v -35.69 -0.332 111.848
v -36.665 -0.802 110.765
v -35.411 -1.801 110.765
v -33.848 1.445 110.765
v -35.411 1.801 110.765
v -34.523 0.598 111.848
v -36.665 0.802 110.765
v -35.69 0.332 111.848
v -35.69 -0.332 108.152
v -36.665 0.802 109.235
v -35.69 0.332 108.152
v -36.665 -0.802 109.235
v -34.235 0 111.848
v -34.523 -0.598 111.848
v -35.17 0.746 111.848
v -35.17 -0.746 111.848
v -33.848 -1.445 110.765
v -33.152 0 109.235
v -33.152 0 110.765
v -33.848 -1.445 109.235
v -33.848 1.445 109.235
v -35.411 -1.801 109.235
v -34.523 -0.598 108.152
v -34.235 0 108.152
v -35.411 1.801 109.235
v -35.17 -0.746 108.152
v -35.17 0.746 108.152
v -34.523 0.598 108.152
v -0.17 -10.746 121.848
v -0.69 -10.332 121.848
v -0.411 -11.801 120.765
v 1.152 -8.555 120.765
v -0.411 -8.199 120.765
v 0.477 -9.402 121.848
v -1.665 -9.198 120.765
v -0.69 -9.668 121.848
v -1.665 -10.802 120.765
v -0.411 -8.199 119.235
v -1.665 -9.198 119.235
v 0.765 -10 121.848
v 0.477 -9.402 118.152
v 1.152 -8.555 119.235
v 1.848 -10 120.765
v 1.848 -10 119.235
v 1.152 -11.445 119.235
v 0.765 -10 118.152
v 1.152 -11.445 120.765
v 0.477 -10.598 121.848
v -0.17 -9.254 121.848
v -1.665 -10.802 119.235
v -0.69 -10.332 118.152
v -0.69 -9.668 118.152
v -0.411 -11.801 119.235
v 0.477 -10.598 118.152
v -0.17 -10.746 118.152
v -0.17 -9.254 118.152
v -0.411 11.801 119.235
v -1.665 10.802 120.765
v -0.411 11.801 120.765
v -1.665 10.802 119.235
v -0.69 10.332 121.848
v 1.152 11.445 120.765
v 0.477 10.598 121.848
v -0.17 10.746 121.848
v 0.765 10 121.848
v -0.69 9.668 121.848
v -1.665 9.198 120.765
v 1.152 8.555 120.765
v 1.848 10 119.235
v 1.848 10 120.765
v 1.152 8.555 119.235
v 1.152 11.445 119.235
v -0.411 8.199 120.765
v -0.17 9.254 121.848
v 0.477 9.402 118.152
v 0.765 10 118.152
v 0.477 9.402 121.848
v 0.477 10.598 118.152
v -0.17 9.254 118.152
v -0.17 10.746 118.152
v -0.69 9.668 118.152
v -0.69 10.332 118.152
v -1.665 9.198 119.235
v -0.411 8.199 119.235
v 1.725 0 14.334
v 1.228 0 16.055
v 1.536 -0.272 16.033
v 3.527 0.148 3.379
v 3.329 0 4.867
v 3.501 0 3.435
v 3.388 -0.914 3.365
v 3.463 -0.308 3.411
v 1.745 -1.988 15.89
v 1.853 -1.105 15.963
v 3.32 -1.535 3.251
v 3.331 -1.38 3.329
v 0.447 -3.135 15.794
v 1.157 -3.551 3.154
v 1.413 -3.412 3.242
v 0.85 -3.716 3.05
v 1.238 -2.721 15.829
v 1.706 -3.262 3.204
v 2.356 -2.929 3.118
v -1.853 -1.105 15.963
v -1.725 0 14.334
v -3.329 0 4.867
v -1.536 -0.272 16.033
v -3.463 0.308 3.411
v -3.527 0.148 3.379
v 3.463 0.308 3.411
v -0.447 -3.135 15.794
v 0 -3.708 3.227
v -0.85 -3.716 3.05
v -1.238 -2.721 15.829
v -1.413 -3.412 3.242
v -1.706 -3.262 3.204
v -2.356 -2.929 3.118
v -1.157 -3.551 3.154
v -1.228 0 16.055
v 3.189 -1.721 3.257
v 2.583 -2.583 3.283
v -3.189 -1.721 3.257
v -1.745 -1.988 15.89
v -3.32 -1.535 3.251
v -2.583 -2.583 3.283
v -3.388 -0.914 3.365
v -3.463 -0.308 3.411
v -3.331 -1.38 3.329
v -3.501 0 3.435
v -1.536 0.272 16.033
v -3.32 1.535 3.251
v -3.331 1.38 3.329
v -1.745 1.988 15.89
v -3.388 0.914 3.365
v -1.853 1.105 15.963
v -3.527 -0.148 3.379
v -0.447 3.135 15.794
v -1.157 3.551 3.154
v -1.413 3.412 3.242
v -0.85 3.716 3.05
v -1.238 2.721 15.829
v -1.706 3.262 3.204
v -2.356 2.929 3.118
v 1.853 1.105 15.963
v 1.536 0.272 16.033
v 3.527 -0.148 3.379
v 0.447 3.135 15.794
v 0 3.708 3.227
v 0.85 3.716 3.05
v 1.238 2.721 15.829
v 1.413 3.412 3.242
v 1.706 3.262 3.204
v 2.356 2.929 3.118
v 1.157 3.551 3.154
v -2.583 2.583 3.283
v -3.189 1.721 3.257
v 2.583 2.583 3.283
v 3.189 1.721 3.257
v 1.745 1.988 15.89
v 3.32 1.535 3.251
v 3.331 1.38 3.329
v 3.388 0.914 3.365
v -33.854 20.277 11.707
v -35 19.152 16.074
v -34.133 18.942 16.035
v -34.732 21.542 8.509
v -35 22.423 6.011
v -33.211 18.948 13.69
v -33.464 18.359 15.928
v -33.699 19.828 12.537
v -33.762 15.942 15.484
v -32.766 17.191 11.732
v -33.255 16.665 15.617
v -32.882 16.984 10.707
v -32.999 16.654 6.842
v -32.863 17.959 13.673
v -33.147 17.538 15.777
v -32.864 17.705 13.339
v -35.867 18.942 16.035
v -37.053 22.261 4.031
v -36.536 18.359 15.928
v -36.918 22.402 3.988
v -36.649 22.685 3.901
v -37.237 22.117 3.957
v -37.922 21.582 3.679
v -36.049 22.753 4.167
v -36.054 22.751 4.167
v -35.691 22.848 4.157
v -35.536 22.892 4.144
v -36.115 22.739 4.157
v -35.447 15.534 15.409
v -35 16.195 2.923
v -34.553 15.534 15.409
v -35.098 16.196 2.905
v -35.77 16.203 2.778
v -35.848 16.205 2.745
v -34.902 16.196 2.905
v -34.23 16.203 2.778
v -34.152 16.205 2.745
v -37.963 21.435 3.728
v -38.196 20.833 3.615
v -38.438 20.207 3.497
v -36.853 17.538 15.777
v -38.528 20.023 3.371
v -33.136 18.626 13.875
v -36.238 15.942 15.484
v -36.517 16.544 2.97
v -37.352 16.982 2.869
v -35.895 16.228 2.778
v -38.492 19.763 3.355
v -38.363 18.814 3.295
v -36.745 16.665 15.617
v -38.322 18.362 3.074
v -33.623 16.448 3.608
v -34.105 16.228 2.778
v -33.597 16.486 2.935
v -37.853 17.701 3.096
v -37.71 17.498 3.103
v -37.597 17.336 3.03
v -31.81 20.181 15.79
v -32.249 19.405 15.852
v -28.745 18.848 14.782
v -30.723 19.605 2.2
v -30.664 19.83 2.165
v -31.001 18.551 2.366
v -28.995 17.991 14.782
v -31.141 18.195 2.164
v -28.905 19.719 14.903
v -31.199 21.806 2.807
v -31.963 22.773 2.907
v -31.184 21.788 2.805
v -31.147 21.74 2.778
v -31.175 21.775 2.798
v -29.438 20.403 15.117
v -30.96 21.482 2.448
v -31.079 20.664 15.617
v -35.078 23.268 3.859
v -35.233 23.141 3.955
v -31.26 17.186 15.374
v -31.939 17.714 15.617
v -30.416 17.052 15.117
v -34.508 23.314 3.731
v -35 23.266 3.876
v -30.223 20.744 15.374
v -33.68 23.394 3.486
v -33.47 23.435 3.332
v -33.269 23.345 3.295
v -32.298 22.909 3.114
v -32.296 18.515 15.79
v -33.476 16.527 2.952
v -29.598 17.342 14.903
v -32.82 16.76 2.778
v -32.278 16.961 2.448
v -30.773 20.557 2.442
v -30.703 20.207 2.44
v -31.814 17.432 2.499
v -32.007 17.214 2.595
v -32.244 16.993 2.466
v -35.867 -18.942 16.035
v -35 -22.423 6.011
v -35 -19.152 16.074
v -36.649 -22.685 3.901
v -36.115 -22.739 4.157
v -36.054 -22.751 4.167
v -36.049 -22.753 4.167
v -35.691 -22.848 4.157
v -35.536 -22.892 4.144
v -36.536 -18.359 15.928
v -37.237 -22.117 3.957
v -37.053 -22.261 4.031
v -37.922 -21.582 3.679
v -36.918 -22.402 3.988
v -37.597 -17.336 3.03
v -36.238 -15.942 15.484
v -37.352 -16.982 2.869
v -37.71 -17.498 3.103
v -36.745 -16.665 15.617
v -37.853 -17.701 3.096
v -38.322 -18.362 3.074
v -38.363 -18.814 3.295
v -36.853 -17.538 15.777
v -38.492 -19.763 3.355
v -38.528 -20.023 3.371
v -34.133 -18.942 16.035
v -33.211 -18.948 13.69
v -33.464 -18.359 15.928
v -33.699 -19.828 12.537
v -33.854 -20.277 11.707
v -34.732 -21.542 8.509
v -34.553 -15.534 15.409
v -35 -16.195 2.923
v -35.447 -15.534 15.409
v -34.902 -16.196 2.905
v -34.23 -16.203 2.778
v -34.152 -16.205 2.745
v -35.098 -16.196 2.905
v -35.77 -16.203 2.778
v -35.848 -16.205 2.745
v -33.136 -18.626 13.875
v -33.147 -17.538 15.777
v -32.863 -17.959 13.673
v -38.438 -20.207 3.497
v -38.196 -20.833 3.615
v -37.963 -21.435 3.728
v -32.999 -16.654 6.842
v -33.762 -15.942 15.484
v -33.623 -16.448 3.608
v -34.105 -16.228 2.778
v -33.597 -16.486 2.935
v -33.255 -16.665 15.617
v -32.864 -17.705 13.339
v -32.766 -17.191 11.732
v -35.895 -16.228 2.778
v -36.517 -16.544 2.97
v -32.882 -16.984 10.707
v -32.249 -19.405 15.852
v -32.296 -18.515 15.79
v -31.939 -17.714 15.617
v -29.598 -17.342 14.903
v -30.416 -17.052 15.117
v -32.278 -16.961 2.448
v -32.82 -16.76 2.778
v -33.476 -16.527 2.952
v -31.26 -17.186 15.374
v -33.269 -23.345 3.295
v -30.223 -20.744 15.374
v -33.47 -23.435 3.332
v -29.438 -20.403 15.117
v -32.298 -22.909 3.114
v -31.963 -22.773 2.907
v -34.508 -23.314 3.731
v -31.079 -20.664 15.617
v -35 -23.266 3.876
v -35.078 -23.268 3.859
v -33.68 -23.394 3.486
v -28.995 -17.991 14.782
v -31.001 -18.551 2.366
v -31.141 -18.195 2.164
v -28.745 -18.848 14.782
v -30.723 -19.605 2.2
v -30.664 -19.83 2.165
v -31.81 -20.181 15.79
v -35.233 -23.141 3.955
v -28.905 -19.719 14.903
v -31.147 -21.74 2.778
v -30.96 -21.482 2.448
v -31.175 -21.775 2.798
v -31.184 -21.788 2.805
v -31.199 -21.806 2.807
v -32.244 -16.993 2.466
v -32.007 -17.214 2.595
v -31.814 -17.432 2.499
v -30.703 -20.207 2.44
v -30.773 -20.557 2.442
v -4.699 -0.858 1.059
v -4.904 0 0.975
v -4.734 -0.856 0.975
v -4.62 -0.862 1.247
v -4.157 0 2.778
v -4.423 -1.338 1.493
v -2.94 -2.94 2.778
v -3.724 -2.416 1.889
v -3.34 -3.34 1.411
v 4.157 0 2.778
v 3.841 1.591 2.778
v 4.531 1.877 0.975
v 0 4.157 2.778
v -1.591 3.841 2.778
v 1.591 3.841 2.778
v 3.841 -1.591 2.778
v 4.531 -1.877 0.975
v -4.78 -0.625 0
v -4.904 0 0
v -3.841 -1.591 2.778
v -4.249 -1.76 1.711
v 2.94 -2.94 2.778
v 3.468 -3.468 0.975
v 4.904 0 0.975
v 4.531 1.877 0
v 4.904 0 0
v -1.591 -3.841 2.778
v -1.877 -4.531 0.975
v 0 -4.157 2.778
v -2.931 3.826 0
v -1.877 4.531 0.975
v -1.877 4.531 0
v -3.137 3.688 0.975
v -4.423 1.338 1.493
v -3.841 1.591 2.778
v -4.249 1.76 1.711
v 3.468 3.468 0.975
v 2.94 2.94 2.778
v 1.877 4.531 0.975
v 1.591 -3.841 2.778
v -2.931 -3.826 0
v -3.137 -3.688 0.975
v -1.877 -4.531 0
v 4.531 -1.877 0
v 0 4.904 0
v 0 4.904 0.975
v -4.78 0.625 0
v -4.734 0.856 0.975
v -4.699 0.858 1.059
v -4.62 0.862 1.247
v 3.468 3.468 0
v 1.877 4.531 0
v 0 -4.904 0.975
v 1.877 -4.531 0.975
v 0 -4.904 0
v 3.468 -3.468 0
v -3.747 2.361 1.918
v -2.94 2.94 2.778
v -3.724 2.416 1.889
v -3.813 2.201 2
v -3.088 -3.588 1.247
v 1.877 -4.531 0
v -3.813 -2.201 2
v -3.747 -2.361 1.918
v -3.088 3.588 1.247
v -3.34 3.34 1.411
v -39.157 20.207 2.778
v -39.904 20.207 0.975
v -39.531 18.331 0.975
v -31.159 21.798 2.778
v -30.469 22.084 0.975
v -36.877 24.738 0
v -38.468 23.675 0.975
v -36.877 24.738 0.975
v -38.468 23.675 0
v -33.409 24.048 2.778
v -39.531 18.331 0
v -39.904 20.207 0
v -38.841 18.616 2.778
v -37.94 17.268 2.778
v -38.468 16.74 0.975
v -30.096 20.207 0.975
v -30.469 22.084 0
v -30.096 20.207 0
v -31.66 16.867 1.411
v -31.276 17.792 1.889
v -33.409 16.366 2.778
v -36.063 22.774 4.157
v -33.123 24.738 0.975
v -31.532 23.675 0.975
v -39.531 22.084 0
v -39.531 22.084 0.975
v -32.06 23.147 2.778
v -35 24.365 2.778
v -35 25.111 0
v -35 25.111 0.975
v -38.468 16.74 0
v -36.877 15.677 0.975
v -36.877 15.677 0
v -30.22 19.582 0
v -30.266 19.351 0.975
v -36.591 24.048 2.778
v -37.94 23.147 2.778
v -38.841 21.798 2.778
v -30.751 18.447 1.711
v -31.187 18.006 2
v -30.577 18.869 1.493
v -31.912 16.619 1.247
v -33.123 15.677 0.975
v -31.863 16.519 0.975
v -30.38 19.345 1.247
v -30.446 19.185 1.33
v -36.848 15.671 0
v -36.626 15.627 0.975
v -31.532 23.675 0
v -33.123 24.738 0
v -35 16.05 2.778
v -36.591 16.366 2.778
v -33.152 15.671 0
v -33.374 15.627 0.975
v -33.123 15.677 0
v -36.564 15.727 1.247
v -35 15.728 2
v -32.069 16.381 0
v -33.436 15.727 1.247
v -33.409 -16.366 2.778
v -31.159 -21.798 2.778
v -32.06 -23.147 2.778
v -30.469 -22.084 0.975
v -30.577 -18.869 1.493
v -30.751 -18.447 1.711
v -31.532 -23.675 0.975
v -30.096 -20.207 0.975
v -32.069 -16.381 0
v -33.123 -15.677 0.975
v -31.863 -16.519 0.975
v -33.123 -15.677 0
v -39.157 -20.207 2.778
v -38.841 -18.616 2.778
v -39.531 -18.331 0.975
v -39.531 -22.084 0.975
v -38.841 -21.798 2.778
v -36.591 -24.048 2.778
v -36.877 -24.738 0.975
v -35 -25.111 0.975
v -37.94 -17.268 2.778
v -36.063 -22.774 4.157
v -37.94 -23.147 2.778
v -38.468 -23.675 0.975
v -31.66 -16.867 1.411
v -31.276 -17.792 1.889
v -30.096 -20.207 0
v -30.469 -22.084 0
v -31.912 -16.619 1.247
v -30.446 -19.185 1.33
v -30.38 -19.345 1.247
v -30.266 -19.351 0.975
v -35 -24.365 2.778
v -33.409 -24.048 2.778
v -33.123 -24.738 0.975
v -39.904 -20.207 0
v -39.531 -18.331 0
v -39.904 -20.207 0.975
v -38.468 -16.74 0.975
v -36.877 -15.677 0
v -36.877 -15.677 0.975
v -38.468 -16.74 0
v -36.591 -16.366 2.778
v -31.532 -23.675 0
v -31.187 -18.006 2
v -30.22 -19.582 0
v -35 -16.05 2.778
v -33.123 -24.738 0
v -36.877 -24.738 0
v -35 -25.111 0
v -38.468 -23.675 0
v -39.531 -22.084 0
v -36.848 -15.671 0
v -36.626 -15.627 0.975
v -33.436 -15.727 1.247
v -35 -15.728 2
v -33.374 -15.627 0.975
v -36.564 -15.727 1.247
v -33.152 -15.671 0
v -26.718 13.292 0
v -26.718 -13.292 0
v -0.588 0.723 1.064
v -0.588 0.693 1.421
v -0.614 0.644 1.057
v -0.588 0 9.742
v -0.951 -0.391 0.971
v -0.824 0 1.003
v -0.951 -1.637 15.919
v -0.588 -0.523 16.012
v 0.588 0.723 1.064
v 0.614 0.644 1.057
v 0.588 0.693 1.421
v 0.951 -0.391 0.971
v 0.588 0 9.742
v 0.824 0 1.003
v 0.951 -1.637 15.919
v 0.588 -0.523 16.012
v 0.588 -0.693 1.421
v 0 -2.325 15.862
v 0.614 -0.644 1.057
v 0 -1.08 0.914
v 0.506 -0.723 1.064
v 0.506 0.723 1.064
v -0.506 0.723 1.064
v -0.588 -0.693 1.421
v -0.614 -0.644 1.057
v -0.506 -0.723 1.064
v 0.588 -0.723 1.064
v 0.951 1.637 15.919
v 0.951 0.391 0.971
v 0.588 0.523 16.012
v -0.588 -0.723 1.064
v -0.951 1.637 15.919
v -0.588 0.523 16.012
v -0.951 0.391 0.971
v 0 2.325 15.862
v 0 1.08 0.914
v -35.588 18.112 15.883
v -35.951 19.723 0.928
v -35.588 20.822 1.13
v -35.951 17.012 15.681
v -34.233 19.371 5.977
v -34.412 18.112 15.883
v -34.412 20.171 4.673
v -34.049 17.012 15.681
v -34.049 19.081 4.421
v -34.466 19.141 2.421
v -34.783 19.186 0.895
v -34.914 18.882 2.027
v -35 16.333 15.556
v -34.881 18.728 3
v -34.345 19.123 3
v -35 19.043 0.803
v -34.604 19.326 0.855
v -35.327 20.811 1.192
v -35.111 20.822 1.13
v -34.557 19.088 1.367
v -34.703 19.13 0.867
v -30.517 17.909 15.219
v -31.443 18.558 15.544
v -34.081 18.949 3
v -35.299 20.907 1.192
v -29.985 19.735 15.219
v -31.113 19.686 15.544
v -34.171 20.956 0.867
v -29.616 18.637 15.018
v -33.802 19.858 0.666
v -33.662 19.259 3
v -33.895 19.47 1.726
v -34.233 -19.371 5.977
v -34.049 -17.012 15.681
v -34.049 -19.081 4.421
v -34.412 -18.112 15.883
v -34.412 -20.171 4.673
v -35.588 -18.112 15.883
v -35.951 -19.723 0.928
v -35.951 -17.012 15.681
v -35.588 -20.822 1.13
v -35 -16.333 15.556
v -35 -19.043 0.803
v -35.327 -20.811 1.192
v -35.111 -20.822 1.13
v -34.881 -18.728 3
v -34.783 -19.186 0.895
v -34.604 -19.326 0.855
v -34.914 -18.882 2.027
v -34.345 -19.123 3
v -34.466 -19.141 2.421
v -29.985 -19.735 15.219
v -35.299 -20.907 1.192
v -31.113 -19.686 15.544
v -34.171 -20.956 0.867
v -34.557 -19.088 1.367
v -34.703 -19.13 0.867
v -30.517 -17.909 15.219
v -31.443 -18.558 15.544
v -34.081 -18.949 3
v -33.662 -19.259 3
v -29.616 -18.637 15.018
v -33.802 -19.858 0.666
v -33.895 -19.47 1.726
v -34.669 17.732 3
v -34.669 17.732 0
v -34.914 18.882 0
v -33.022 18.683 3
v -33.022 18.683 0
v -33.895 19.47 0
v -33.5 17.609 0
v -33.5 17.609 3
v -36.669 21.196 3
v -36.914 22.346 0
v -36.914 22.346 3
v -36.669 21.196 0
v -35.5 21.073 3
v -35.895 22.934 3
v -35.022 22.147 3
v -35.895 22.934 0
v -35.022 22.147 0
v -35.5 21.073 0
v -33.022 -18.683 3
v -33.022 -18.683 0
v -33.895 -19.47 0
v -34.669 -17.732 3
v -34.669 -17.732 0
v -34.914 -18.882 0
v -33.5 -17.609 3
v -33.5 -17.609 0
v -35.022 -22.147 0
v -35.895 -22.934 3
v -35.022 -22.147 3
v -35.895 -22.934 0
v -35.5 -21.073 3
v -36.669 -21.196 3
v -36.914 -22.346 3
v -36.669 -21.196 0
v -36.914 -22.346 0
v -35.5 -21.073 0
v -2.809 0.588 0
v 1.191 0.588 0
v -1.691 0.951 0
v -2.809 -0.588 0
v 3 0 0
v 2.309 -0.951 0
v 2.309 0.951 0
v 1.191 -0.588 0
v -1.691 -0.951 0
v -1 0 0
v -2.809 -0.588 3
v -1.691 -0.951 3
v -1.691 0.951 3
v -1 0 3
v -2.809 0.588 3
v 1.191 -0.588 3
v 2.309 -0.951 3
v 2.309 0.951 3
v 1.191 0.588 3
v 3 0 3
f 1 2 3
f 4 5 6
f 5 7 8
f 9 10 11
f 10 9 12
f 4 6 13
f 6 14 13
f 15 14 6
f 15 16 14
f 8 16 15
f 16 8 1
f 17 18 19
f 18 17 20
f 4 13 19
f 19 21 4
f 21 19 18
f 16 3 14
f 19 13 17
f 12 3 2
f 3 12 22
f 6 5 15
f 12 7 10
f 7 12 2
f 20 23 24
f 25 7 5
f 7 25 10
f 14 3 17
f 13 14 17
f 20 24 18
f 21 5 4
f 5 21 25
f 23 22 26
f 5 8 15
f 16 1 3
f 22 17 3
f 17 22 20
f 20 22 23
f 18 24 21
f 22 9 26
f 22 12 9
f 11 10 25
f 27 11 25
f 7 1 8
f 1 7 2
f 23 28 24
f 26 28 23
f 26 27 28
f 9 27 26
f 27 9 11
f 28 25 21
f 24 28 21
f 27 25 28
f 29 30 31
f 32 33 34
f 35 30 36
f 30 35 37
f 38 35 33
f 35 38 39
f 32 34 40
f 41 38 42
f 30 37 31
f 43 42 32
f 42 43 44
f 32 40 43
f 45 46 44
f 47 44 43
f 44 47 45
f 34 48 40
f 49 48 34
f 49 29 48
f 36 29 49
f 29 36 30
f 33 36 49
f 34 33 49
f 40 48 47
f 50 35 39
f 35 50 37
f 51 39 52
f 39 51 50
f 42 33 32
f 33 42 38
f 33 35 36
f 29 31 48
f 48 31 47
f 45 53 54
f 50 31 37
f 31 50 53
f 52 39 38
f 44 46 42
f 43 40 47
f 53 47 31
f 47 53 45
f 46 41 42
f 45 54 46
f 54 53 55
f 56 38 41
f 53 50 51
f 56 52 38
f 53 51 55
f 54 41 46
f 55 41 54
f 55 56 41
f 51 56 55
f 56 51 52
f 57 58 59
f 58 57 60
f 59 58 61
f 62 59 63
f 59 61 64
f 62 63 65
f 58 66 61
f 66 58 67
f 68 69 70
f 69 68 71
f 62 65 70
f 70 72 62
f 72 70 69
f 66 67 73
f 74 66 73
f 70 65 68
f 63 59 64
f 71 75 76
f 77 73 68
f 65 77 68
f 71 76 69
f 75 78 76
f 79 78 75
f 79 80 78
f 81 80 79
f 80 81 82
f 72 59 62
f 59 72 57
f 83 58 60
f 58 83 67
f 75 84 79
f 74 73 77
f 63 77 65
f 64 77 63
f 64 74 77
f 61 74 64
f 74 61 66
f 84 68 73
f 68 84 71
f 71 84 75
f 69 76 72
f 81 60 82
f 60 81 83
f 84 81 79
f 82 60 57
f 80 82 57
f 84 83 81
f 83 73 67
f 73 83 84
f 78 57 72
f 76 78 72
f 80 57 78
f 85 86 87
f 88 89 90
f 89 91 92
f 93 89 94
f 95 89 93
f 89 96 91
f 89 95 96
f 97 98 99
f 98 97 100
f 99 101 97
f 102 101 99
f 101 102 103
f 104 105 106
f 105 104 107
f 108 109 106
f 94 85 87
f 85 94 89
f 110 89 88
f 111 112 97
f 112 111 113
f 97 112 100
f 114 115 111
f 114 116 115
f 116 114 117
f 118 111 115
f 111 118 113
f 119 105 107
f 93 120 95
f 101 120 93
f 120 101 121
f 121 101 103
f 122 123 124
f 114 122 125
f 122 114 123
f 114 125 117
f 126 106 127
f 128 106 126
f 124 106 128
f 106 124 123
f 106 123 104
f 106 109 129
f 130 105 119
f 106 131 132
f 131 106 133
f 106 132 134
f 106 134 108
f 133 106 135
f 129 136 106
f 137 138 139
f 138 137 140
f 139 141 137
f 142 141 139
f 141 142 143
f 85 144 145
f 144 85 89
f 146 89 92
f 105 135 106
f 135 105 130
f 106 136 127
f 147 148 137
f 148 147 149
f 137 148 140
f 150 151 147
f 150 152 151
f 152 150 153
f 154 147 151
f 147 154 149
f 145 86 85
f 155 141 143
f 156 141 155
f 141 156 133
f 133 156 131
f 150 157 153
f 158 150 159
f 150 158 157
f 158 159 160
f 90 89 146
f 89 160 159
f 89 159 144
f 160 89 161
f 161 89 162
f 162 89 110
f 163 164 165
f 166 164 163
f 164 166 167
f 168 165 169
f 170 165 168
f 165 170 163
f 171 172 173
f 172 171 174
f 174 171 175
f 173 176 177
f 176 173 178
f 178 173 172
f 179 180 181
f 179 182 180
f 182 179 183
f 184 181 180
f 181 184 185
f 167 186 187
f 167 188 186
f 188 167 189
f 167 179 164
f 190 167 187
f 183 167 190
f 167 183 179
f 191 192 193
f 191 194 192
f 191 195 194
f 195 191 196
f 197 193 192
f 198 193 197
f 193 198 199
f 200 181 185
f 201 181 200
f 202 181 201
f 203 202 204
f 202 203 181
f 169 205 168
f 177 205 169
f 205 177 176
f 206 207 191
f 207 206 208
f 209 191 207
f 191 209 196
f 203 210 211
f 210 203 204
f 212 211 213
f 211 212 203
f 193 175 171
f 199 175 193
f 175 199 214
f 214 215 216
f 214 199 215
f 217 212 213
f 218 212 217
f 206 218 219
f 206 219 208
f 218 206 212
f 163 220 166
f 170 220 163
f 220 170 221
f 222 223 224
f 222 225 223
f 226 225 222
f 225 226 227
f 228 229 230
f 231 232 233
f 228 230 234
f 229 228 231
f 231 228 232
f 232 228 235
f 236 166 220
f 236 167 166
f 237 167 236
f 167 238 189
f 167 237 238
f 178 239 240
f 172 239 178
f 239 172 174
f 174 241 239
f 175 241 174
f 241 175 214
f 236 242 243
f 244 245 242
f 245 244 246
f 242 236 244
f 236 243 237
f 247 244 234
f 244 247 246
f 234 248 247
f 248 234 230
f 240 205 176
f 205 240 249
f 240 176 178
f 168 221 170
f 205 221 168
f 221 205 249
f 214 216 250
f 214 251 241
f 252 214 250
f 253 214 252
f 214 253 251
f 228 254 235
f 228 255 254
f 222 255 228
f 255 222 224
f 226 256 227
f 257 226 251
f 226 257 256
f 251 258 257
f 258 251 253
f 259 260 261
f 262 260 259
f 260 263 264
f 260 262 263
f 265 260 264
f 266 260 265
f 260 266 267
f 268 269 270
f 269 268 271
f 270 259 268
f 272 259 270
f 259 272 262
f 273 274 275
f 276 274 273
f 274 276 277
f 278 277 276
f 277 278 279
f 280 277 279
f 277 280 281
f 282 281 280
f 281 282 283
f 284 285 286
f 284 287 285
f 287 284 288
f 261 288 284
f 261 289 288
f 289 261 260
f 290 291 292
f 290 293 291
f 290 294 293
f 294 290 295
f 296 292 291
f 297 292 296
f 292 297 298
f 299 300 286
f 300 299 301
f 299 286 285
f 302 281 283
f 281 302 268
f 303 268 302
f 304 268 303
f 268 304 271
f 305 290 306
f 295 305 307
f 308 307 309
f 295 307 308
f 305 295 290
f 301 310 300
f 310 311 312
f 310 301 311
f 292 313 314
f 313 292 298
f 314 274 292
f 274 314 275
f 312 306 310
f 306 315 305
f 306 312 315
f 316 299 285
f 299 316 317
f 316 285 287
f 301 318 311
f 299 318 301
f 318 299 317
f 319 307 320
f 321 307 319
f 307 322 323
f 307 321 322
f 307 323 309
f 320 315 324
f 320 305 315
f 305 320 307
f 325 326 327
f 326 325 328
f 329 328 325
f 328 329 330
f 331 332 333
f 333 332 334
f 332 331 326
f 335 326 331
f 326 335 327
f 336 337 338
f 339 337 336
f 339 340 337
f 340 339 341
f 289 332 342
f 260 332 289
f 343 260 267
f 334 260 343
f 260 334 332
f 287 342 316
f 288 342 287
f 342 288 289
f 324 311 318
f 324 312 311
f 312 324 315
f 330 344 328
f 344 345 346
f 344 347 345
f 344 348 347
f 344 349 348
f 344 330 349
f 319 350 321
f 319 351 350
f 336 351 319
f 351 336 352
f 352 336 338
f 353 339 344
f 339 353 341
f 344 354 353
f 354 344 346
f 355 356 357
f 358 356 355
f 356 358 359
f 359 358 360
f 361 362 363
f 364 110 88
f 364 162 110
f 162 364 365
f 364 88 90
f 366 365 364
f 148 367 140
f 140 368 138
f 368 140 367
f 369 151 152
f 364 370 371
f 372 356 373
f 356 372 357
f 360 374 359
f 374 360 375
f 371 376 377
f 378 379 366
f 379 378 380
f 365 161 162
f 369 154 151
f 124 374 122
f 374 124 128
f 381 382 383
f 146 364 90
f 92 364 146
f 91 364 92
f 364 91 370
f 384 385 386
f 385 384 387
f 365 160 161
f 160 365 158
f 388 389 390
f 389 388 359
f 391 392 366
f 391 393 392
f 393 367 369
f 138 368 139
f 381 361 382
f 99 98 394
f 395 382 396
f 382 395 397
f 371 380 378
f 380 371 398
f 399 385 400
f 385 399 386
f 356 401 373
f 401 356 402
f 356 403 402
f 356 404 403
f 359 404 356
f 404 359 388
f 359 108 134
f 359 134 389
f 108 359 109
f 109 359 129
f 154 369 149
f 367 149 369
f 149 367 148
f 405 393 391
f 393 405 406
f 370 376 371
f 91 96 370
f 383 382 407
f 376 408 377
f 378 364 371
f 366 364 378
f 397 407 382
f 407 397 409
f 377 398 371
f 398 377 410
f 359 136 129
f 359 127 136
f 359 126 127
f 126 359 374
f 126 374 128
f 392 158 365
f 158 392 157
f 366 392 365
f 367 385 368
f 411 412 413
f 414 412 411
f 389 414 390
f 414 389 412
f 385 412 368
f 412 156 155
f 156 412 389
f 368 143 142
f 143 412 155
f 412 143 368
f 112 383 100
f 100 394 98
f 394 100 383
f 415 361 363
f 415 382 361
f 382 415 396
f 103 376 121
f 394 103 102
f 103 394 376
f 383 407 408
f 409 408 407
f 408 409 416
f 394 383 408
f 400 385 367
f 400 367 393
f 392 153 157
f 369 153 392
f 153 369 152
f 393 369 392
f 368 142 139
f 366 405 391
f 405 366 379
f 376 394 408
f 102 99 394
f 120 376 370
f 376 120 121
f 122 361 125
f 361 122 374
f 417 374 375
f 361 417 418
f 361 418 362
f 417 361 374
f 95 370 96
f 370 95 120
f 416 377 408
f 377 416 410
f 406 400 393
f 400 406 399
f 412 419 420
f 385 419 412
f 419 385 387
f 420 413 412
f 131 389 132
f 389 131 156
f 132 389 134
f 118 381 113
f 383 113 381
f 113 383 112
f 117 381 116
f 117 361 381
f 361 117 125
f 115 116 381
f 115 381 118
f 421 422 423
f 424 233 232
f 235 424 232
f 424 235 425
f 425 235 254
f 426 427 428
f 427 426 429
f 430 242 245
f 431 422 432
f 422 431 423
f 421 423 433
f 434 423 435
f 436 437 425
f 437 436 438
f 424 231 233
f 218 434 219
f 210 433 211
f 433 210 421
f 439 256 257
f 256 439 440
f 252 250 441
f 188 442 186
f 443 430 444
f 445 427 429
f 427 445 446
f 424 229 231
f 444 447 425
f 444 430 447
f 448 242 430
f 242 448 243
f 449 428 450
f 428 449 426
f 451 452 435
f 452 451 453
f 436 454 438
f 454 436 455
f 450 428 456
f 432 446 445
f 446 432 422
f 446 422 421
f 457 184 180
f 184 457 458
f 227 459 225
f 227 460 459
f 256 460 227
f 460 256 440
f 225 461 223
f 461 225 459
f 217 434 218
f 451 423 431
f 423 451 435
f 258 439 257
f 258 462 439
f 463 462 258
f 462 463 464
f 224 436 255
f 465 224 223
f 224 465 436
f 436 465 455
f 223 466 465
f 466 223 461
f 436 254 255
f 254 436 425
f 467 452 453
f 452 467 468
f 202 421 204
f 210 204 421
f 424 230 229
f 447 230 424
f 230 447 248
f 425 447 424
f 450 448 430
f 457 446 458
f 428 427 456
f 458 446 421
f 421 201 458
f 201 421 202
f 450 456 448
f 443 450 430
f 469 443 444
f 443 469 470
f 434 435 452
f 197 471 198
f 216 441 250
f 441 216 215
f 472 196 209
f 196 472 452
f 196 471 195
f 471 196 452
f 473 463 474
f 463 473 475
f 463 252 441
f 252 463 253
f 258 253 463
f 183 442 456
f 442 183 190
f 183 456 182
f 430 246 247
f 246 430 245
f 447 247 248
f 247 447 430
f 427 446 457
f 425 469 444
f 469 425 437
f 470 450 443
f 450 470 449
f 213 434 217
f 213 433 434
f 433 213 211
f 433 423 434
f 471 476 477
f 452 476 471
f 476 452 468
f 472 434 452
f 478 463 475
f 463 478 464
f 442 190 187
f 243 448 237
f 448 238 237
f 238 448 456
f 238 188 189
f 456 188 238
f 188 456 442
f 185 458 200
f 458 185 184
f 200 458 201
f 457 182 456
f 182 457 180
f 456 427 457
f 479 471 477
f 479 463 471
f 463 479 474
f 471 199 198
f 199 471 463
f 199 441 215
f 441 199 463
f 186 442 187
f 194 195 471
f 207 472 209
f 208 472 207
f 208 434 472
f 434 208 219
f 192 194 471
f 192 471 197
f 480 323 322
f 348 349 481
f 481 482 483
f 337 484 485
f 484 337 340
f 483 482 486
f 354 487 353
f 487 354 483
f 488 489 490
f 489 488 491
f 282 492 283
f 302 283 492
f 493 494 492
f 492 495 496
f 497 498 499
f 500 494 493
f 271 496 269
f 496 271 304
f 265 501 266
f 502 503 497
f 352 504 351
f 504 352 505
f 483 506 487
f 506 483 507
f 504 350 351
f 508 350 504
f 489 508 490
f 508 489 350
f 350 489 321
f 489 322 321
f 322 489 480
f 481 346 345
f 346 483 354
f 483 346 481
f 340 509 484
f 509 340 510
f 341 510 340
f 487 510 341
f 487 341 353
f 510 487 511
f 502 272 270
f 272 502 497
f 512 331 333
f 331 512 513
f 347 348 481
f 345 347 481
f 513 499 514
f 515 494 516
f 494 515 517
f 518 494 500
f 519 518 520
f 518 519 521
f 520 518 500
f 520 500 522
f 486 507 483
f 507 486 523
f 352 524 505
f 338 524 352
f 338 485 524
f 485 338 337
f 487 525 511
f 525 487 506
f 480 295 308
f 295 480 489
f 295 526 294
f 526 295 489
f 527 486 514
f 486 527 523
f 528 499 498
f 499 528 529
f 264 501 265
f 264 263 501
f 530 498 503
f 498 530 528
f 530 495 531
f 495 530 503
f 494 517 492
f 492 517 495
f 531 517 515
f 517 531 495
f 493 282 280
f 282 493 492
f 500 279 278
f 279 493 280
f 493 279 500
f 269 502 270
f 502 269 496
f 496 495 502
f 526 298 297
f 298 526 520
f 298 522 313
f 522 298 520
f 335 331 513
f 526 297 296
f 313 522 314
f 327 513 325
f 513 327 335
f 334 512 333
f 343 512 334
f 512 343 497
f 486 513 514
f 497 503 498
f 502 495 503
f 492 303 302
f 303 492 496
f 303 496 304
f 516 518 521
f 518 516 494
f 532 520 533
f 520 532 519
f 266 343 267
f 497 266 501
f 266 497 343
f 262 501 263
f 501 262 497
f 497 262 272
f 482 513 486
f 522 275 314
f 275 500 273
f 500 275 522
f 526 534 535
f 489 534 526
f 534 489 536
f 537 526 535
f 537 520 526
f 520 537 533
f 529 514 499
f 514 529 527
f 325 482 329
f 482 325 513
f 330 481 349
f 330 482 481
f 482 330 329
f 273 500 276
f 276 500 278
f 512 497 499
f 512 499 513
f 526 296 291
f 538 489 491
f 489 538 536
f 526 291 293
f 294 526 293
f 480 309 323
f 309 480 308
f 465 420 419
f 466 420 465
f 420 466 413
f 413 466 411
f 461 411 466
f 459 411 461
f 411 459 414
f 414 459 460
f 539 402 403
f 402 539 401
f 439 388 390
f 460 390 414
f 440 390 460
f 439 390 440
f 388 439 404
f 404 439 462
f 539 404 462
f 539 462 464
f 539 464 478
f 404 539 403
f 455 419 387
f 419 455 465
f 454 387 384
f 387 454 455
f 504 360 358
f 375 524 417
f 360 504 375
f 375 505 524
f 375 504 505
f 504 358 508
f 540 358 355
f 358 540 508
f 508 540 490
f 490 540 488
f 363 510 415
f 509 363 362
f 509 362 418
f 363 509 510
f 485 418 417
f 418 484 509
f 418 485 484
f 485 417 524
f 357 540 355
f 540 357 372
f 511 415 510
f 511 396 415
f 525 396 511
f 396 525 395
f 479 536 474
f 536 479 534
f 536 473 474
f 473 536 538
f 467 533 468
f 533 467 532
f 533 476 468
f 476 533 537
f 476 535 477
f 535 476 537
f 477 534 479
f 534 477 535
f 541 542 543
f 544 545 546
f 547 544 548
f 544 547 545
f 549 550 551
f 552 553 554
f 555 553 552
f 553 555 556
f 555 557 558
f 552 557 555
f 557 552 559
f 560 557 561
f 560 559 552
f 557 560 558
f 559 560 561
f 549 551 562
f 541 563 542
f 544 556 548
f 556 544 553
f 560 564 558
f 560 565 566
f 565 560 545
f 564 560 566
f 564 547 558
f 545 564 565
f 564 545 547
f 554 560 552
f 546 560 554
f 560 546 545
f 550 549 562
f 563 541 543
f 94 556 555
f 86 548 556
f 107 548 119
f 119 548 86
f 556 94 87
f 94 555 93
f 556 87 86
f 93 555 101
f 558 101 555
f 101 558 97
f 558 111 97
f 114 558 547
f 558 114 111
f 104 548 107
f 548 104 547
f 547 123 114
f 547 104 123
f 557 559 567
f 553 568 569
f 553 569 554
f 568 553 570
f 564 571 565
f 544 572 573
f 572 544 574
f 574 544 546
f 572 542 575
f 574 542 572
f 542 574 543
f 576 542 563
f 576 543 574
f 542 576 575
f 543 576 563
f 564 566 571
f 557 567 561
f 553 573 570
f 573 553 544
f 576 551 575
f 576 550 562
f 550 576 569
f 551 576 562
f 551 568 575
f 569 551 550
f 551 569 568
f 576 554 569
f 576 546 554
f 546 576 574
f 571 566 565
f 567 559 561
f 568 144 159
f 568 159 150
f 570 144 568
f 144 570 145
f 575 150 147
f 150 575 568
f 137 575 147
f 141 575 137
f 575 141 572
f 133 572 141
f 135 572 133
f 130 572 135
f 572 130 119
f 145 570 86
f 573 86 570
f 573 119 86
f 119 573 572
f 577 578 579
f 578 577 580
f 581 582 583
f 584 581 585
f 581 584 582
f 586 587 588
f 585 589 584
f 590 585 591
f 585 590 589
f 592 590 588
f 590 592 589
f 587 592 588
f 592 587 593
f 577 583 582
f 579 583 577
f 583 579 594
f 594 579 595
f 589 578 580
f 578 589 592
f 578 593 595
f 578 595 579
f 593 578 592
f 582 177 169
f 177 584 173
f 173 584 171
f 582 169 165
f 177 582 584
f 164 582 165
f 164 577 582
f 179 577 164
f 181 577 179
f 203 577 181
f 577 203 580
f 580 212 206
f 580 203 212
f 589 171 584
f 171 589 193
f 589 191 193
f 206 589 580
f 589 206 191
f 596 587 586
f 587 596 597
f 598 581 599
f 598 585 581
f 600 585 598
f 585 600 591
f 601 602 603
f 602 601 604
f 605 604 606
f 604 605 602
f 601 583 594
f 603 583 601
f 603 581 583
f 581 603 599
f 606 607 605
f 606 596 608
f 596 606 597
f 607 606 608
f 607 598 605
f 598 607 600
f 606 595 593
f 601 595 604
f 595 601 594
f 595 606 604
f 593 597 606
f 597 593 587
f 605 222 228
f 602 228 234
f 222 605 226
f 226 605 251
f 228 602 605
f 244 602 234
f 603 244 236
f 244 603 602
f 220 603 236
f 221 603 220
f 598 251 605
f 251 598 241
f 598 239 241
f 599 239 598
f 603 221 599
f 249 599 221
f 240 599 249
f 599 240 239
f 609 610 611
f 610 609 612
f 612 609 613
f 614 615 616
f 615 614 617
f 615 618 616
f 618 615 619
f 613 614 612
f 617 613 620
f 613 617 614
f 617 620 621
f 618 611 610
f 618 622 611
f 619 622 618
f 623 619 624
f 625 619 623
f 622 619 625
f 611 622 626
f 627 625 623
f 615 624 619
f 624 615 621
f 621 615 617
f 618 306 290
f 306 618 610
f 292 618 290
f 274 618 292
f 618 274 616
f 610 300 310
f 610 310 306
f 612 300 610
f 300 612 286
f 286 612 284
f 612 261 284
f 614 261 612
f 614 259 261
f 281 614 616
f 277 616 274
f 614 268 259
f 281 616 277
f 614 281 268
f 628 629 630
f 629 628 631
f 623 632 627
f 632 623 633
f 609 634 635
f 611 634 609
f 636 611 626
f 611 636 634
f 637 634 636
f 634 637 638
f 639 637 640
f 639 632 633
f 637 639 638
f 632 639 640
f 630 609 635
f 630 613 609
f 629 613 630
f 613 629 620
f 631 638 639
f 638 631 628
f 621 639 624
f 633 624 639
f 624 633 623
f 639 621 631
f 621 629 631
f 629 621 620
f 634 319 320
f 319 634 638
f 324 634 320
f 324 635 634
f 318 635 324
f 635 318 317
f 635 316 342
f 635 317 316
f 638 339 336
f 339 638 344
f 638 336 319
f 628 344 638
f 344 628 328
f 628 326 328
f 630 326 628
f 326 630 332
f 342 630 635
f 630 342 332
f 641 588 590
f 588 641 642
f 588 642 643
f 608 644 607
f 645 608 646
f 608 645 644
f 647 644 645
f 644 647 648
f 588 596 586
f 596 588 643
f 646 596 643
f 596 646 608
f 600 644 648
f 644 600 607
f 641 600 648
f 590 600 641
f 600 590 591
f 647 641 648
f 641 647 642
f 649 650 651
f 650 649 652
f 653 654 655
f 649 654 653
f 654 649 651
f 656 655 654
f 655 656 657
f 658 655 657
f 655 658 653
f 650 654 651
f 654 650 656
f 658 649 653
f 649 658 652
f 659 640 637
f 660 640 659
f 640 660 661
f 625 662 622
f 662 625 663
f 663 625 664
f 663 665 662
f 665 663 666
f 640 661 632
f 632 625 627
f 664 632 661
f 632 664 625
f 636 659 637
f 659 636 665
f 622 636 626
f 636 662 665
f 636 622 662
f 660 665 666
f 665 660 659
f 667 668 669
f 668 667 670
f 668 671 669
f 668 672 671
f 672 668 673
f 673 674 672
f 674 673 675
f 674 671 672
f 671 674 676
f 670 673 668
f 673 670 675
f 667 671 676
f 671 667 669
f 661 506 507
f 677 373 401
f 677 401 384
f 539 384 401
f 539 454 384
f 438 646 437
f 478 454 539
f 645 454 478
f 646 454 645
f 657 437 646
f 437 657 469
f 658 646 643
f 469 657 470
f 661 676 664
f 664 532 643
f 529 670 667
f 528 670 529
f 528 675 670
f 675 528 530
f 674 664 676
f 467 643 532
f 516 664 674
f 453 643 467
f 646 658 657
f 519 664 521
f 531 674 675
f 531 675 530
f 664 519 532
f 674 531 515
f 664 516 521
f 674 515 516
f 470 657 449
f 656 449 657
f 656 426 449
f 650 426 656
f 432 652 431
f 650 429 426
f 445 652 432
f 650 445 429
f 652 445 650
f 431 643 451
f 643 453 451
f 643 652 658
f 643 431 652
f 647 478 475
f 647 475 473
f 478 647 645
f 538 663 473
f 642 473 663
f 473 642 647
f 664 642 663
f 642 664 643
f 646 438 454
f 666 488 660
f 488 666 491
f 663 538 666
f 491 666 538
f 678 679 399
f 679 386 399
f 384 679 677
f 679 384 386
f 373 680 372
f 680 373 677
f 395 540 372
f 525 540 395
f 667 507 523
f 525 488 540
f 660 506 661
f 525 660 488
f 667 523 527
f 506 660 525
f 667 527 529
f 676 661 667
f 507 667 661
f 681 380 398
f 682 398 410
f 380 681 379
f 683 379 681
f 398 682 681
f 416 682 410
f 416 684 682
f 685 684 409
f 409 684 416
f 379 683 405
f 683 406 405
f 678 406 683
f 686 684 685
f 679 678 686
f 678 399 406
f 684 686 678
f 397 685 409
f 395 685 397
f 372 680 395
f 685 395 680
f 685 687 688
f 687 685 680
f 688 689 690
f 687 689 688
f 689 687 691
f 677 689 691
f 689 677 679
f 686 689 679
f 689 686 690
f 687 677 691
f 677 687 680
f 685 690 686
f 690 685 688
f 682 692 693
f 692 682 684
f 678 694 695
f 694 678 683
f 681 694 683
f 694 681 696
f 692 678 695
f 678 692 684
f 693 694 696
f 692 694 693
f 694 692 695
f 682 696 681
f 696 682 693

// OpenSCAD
// file: Geometry.scad
function getVec(p, q) = [p[0]-q[0], p[1]-q[1], p[2]-q[2]];
function crossProd(u, v) = [u[1]*v[2]-u[2]*v[1], u[2]*v[0]-u[0]*v[2], u[0]*v[1]-u[1]*v[0]];
function dotProd(u, v) = u[0]*v[0]+u[1]*v[1]+u[2]*v[2];													
function getAngle(u, v) = asin(norm(crossProd(u, v))/norm(u)/norm(v));
function normalize(v) = v/norm(v);
function getDistance(u, v) = norm([v[0]-u[0], v[1]-u[1], v[2]-u[2]]);
function getRotatedPlane(dir, angle, plane) = [0, 0, 0, 0]; // TO DO
function getPlane1(p, n) =
	normalize(concat(n, dotProd(p, n)));
function getPlane2(p, q, r) = 
	let(t = normalize(crossProd(getVec(p, q), getVec(p, r))))
	normalize(concat(t, -dotProd(p, t)));
function getProjection(p, plane) =
	let(p2=[-plane[3]/plane[0], 0, 0]) //random point on plane
		let(t=(plane[0]*p2[0]-plane[0]*p[0]+plane[1]*p2[1]-plane[1]*p[1]+plane[2]*p2[2]-plane[2]*p[2])/(pow(plane[0],2)+pow(plane[1],2)+pow(plane[2],2)))
			p+t*[plane[0], plane[1], plane[2]];

echo(getProjection([1, 1, 1], [1, 1, 0, 3]));
//echo(dotProd([1, 1, 0], [-1, 1, 0]));
//echo(getAngle([-1, 1, 0], [1, 1, 0]));
//echo(getDistance([-3, 1, 1], [1, 1, 0]));
//
//echo(getPlane2([1, 1, 0], [-1, 1, 2], [1, -1, 6]));
//echo(getPlane1([0, 0, 0], crossProd([-1, 1, 2], [1, -1, 6])));
// main file
use <Geometry.scad>

d_wire = 2; //hole diameter for wire
_Aalpha = 60; //degrees
_Ah = 35; //mm
_A = [[0, 0, 0],
			[-_Ah,_Ah*tan(_Aalpha/2),0],
			[-_Ah,-_Ah*tan(_Aalpha/2),0]
			];

_Balpha = 30; //degrees
_Bh = 35; //mm
_theta = 20; //degrees
_B = [[-_Ah, 0, 110],
			[-_Ah+_Bh, -10, 120],
			[-_Ah+_Bh, 10, 120]
			];

module draw(A, B, fn = $fn)
{
	//points B
	for(j=[0:len(B)-1])
		translate(B[j])
			color("blue")
				sphere(2);
	//
	vA0B1 = [A[0][0]-B[1][0], A[0][1]-B[1][1], A[0][2]-B[1][2]];
	vA0B2 = [A[0][0]-B[2][0], A[0][1]-B[2][1], A[0][2]-B[2][2]];
	vA1B0 = [A[1][0]-B[0][0], A[1][1]-B[0][1], A[1][2]-B[0][2]];
	vA1B2 = [A[1][0]-B[2][0], A[1][1]-B[2][1], A[1][2]-B[2][2]]; // * 4
	vA2B0 = [A[2][0]-B[0][0], A[2][1]-B[0][1], A[2][2]-B[0][2]];
	vA2B1 = [A[2][0]-B[1][0], A[2][1]-B[1][1], A[2][2]-B[1][2]]; // * 6
	
	dirVec = [normalize(vA0B1),
						normalize(vA0B2),
						normalize(vA1B0),
						normalize(vA2B1), // *6
						normalize(vA2B0),
						normalize(vA1B2)]; // *4
	
	posVec = [A[0], A[0], A[1], A[1], A[2], A[2]];
	
	difference()
	{
		union()
		{
			//points A
			translate(A[0]) sphere(5);
			translate(A[1]) sphere(5);
			translate(A[2]) sphere(5);
			//bars
			drawBar(4, A[0], A[1]);
			drawBar(4, A[0], A[2]);
			drawBar(4, A[1], A[2]);
			
			//cones
			for(i=[0:len(dirVec)-1])
				translate(posVec[i])
			
				rotate([0, -atan(norm([dirVec[i][0], dirVec[i][1]])/dirVec[i][2]), -atan(dirVec[i][1]/dirVec[i][0])])
					rotate_extrude()
						polygon(points = [[0, 0], [4, 0], [0, 30]]);
		}
		for(i=[0:len(dirVec)-1])
			translate(posVec[i])
				rotate([0, -atan(norm([dirVec[i][0], dirVec[i][1]])/dirVec[i][2]), -atan(dirVec[i][1]/dirVec[i][0])])
				{
					translate([0, 0, 1]) cylinder(d = d_wire, h = 66);
					translate([0, 0, 16]) cylinder(d = 10, h = 30);
				}
		translate([0, 0, -20])
			cube([200, 200, 40], center=true);
		
		//alignment holes
		translate(A[0] + [-2, 0, 0]) cylinder(d = d_wire, h = 6, center=true);
		translate(A[0]+[2, 0, 0]) cylinder(d = d_wire, h = 6, center=true);
		translate(A[1]) rotate([0, 0, -(180-_Aalpha)/2]){
			translate([2, 0, 0]) cylinder(d = d_wire, h = 6, center=true);
			translate([-2, 0, 0]) cylinder(d = d_wire, h = 6, center=true);}
		translate(A[2]) rotate([0, 0, (180-_Aalpha)/2]){
			translate([2, 0, 0]) cylinder(d = d_wire, h = 6, center=true);
			translate([-2, 0, 0]) cylinder(d = d_wire, h = 6, center=true);} 	
	}
}

module drawBar(diameter, p1, p2)
{
	vDir = [p1[0]-p2[0], p1[1]-p2[1], p1[2]-p2[2]];
	translate(vDir/2+p2)
		rotate([0, -atan(norm([vDir[0], vDir[1]])/vDir[2]), atan(vDir[1]/vDir[0])])
			cylinder(d = diameter, h=norm(vDir), center=true);
}

echo(normalize([3, 4, 5]));
draw(_A, _B);
